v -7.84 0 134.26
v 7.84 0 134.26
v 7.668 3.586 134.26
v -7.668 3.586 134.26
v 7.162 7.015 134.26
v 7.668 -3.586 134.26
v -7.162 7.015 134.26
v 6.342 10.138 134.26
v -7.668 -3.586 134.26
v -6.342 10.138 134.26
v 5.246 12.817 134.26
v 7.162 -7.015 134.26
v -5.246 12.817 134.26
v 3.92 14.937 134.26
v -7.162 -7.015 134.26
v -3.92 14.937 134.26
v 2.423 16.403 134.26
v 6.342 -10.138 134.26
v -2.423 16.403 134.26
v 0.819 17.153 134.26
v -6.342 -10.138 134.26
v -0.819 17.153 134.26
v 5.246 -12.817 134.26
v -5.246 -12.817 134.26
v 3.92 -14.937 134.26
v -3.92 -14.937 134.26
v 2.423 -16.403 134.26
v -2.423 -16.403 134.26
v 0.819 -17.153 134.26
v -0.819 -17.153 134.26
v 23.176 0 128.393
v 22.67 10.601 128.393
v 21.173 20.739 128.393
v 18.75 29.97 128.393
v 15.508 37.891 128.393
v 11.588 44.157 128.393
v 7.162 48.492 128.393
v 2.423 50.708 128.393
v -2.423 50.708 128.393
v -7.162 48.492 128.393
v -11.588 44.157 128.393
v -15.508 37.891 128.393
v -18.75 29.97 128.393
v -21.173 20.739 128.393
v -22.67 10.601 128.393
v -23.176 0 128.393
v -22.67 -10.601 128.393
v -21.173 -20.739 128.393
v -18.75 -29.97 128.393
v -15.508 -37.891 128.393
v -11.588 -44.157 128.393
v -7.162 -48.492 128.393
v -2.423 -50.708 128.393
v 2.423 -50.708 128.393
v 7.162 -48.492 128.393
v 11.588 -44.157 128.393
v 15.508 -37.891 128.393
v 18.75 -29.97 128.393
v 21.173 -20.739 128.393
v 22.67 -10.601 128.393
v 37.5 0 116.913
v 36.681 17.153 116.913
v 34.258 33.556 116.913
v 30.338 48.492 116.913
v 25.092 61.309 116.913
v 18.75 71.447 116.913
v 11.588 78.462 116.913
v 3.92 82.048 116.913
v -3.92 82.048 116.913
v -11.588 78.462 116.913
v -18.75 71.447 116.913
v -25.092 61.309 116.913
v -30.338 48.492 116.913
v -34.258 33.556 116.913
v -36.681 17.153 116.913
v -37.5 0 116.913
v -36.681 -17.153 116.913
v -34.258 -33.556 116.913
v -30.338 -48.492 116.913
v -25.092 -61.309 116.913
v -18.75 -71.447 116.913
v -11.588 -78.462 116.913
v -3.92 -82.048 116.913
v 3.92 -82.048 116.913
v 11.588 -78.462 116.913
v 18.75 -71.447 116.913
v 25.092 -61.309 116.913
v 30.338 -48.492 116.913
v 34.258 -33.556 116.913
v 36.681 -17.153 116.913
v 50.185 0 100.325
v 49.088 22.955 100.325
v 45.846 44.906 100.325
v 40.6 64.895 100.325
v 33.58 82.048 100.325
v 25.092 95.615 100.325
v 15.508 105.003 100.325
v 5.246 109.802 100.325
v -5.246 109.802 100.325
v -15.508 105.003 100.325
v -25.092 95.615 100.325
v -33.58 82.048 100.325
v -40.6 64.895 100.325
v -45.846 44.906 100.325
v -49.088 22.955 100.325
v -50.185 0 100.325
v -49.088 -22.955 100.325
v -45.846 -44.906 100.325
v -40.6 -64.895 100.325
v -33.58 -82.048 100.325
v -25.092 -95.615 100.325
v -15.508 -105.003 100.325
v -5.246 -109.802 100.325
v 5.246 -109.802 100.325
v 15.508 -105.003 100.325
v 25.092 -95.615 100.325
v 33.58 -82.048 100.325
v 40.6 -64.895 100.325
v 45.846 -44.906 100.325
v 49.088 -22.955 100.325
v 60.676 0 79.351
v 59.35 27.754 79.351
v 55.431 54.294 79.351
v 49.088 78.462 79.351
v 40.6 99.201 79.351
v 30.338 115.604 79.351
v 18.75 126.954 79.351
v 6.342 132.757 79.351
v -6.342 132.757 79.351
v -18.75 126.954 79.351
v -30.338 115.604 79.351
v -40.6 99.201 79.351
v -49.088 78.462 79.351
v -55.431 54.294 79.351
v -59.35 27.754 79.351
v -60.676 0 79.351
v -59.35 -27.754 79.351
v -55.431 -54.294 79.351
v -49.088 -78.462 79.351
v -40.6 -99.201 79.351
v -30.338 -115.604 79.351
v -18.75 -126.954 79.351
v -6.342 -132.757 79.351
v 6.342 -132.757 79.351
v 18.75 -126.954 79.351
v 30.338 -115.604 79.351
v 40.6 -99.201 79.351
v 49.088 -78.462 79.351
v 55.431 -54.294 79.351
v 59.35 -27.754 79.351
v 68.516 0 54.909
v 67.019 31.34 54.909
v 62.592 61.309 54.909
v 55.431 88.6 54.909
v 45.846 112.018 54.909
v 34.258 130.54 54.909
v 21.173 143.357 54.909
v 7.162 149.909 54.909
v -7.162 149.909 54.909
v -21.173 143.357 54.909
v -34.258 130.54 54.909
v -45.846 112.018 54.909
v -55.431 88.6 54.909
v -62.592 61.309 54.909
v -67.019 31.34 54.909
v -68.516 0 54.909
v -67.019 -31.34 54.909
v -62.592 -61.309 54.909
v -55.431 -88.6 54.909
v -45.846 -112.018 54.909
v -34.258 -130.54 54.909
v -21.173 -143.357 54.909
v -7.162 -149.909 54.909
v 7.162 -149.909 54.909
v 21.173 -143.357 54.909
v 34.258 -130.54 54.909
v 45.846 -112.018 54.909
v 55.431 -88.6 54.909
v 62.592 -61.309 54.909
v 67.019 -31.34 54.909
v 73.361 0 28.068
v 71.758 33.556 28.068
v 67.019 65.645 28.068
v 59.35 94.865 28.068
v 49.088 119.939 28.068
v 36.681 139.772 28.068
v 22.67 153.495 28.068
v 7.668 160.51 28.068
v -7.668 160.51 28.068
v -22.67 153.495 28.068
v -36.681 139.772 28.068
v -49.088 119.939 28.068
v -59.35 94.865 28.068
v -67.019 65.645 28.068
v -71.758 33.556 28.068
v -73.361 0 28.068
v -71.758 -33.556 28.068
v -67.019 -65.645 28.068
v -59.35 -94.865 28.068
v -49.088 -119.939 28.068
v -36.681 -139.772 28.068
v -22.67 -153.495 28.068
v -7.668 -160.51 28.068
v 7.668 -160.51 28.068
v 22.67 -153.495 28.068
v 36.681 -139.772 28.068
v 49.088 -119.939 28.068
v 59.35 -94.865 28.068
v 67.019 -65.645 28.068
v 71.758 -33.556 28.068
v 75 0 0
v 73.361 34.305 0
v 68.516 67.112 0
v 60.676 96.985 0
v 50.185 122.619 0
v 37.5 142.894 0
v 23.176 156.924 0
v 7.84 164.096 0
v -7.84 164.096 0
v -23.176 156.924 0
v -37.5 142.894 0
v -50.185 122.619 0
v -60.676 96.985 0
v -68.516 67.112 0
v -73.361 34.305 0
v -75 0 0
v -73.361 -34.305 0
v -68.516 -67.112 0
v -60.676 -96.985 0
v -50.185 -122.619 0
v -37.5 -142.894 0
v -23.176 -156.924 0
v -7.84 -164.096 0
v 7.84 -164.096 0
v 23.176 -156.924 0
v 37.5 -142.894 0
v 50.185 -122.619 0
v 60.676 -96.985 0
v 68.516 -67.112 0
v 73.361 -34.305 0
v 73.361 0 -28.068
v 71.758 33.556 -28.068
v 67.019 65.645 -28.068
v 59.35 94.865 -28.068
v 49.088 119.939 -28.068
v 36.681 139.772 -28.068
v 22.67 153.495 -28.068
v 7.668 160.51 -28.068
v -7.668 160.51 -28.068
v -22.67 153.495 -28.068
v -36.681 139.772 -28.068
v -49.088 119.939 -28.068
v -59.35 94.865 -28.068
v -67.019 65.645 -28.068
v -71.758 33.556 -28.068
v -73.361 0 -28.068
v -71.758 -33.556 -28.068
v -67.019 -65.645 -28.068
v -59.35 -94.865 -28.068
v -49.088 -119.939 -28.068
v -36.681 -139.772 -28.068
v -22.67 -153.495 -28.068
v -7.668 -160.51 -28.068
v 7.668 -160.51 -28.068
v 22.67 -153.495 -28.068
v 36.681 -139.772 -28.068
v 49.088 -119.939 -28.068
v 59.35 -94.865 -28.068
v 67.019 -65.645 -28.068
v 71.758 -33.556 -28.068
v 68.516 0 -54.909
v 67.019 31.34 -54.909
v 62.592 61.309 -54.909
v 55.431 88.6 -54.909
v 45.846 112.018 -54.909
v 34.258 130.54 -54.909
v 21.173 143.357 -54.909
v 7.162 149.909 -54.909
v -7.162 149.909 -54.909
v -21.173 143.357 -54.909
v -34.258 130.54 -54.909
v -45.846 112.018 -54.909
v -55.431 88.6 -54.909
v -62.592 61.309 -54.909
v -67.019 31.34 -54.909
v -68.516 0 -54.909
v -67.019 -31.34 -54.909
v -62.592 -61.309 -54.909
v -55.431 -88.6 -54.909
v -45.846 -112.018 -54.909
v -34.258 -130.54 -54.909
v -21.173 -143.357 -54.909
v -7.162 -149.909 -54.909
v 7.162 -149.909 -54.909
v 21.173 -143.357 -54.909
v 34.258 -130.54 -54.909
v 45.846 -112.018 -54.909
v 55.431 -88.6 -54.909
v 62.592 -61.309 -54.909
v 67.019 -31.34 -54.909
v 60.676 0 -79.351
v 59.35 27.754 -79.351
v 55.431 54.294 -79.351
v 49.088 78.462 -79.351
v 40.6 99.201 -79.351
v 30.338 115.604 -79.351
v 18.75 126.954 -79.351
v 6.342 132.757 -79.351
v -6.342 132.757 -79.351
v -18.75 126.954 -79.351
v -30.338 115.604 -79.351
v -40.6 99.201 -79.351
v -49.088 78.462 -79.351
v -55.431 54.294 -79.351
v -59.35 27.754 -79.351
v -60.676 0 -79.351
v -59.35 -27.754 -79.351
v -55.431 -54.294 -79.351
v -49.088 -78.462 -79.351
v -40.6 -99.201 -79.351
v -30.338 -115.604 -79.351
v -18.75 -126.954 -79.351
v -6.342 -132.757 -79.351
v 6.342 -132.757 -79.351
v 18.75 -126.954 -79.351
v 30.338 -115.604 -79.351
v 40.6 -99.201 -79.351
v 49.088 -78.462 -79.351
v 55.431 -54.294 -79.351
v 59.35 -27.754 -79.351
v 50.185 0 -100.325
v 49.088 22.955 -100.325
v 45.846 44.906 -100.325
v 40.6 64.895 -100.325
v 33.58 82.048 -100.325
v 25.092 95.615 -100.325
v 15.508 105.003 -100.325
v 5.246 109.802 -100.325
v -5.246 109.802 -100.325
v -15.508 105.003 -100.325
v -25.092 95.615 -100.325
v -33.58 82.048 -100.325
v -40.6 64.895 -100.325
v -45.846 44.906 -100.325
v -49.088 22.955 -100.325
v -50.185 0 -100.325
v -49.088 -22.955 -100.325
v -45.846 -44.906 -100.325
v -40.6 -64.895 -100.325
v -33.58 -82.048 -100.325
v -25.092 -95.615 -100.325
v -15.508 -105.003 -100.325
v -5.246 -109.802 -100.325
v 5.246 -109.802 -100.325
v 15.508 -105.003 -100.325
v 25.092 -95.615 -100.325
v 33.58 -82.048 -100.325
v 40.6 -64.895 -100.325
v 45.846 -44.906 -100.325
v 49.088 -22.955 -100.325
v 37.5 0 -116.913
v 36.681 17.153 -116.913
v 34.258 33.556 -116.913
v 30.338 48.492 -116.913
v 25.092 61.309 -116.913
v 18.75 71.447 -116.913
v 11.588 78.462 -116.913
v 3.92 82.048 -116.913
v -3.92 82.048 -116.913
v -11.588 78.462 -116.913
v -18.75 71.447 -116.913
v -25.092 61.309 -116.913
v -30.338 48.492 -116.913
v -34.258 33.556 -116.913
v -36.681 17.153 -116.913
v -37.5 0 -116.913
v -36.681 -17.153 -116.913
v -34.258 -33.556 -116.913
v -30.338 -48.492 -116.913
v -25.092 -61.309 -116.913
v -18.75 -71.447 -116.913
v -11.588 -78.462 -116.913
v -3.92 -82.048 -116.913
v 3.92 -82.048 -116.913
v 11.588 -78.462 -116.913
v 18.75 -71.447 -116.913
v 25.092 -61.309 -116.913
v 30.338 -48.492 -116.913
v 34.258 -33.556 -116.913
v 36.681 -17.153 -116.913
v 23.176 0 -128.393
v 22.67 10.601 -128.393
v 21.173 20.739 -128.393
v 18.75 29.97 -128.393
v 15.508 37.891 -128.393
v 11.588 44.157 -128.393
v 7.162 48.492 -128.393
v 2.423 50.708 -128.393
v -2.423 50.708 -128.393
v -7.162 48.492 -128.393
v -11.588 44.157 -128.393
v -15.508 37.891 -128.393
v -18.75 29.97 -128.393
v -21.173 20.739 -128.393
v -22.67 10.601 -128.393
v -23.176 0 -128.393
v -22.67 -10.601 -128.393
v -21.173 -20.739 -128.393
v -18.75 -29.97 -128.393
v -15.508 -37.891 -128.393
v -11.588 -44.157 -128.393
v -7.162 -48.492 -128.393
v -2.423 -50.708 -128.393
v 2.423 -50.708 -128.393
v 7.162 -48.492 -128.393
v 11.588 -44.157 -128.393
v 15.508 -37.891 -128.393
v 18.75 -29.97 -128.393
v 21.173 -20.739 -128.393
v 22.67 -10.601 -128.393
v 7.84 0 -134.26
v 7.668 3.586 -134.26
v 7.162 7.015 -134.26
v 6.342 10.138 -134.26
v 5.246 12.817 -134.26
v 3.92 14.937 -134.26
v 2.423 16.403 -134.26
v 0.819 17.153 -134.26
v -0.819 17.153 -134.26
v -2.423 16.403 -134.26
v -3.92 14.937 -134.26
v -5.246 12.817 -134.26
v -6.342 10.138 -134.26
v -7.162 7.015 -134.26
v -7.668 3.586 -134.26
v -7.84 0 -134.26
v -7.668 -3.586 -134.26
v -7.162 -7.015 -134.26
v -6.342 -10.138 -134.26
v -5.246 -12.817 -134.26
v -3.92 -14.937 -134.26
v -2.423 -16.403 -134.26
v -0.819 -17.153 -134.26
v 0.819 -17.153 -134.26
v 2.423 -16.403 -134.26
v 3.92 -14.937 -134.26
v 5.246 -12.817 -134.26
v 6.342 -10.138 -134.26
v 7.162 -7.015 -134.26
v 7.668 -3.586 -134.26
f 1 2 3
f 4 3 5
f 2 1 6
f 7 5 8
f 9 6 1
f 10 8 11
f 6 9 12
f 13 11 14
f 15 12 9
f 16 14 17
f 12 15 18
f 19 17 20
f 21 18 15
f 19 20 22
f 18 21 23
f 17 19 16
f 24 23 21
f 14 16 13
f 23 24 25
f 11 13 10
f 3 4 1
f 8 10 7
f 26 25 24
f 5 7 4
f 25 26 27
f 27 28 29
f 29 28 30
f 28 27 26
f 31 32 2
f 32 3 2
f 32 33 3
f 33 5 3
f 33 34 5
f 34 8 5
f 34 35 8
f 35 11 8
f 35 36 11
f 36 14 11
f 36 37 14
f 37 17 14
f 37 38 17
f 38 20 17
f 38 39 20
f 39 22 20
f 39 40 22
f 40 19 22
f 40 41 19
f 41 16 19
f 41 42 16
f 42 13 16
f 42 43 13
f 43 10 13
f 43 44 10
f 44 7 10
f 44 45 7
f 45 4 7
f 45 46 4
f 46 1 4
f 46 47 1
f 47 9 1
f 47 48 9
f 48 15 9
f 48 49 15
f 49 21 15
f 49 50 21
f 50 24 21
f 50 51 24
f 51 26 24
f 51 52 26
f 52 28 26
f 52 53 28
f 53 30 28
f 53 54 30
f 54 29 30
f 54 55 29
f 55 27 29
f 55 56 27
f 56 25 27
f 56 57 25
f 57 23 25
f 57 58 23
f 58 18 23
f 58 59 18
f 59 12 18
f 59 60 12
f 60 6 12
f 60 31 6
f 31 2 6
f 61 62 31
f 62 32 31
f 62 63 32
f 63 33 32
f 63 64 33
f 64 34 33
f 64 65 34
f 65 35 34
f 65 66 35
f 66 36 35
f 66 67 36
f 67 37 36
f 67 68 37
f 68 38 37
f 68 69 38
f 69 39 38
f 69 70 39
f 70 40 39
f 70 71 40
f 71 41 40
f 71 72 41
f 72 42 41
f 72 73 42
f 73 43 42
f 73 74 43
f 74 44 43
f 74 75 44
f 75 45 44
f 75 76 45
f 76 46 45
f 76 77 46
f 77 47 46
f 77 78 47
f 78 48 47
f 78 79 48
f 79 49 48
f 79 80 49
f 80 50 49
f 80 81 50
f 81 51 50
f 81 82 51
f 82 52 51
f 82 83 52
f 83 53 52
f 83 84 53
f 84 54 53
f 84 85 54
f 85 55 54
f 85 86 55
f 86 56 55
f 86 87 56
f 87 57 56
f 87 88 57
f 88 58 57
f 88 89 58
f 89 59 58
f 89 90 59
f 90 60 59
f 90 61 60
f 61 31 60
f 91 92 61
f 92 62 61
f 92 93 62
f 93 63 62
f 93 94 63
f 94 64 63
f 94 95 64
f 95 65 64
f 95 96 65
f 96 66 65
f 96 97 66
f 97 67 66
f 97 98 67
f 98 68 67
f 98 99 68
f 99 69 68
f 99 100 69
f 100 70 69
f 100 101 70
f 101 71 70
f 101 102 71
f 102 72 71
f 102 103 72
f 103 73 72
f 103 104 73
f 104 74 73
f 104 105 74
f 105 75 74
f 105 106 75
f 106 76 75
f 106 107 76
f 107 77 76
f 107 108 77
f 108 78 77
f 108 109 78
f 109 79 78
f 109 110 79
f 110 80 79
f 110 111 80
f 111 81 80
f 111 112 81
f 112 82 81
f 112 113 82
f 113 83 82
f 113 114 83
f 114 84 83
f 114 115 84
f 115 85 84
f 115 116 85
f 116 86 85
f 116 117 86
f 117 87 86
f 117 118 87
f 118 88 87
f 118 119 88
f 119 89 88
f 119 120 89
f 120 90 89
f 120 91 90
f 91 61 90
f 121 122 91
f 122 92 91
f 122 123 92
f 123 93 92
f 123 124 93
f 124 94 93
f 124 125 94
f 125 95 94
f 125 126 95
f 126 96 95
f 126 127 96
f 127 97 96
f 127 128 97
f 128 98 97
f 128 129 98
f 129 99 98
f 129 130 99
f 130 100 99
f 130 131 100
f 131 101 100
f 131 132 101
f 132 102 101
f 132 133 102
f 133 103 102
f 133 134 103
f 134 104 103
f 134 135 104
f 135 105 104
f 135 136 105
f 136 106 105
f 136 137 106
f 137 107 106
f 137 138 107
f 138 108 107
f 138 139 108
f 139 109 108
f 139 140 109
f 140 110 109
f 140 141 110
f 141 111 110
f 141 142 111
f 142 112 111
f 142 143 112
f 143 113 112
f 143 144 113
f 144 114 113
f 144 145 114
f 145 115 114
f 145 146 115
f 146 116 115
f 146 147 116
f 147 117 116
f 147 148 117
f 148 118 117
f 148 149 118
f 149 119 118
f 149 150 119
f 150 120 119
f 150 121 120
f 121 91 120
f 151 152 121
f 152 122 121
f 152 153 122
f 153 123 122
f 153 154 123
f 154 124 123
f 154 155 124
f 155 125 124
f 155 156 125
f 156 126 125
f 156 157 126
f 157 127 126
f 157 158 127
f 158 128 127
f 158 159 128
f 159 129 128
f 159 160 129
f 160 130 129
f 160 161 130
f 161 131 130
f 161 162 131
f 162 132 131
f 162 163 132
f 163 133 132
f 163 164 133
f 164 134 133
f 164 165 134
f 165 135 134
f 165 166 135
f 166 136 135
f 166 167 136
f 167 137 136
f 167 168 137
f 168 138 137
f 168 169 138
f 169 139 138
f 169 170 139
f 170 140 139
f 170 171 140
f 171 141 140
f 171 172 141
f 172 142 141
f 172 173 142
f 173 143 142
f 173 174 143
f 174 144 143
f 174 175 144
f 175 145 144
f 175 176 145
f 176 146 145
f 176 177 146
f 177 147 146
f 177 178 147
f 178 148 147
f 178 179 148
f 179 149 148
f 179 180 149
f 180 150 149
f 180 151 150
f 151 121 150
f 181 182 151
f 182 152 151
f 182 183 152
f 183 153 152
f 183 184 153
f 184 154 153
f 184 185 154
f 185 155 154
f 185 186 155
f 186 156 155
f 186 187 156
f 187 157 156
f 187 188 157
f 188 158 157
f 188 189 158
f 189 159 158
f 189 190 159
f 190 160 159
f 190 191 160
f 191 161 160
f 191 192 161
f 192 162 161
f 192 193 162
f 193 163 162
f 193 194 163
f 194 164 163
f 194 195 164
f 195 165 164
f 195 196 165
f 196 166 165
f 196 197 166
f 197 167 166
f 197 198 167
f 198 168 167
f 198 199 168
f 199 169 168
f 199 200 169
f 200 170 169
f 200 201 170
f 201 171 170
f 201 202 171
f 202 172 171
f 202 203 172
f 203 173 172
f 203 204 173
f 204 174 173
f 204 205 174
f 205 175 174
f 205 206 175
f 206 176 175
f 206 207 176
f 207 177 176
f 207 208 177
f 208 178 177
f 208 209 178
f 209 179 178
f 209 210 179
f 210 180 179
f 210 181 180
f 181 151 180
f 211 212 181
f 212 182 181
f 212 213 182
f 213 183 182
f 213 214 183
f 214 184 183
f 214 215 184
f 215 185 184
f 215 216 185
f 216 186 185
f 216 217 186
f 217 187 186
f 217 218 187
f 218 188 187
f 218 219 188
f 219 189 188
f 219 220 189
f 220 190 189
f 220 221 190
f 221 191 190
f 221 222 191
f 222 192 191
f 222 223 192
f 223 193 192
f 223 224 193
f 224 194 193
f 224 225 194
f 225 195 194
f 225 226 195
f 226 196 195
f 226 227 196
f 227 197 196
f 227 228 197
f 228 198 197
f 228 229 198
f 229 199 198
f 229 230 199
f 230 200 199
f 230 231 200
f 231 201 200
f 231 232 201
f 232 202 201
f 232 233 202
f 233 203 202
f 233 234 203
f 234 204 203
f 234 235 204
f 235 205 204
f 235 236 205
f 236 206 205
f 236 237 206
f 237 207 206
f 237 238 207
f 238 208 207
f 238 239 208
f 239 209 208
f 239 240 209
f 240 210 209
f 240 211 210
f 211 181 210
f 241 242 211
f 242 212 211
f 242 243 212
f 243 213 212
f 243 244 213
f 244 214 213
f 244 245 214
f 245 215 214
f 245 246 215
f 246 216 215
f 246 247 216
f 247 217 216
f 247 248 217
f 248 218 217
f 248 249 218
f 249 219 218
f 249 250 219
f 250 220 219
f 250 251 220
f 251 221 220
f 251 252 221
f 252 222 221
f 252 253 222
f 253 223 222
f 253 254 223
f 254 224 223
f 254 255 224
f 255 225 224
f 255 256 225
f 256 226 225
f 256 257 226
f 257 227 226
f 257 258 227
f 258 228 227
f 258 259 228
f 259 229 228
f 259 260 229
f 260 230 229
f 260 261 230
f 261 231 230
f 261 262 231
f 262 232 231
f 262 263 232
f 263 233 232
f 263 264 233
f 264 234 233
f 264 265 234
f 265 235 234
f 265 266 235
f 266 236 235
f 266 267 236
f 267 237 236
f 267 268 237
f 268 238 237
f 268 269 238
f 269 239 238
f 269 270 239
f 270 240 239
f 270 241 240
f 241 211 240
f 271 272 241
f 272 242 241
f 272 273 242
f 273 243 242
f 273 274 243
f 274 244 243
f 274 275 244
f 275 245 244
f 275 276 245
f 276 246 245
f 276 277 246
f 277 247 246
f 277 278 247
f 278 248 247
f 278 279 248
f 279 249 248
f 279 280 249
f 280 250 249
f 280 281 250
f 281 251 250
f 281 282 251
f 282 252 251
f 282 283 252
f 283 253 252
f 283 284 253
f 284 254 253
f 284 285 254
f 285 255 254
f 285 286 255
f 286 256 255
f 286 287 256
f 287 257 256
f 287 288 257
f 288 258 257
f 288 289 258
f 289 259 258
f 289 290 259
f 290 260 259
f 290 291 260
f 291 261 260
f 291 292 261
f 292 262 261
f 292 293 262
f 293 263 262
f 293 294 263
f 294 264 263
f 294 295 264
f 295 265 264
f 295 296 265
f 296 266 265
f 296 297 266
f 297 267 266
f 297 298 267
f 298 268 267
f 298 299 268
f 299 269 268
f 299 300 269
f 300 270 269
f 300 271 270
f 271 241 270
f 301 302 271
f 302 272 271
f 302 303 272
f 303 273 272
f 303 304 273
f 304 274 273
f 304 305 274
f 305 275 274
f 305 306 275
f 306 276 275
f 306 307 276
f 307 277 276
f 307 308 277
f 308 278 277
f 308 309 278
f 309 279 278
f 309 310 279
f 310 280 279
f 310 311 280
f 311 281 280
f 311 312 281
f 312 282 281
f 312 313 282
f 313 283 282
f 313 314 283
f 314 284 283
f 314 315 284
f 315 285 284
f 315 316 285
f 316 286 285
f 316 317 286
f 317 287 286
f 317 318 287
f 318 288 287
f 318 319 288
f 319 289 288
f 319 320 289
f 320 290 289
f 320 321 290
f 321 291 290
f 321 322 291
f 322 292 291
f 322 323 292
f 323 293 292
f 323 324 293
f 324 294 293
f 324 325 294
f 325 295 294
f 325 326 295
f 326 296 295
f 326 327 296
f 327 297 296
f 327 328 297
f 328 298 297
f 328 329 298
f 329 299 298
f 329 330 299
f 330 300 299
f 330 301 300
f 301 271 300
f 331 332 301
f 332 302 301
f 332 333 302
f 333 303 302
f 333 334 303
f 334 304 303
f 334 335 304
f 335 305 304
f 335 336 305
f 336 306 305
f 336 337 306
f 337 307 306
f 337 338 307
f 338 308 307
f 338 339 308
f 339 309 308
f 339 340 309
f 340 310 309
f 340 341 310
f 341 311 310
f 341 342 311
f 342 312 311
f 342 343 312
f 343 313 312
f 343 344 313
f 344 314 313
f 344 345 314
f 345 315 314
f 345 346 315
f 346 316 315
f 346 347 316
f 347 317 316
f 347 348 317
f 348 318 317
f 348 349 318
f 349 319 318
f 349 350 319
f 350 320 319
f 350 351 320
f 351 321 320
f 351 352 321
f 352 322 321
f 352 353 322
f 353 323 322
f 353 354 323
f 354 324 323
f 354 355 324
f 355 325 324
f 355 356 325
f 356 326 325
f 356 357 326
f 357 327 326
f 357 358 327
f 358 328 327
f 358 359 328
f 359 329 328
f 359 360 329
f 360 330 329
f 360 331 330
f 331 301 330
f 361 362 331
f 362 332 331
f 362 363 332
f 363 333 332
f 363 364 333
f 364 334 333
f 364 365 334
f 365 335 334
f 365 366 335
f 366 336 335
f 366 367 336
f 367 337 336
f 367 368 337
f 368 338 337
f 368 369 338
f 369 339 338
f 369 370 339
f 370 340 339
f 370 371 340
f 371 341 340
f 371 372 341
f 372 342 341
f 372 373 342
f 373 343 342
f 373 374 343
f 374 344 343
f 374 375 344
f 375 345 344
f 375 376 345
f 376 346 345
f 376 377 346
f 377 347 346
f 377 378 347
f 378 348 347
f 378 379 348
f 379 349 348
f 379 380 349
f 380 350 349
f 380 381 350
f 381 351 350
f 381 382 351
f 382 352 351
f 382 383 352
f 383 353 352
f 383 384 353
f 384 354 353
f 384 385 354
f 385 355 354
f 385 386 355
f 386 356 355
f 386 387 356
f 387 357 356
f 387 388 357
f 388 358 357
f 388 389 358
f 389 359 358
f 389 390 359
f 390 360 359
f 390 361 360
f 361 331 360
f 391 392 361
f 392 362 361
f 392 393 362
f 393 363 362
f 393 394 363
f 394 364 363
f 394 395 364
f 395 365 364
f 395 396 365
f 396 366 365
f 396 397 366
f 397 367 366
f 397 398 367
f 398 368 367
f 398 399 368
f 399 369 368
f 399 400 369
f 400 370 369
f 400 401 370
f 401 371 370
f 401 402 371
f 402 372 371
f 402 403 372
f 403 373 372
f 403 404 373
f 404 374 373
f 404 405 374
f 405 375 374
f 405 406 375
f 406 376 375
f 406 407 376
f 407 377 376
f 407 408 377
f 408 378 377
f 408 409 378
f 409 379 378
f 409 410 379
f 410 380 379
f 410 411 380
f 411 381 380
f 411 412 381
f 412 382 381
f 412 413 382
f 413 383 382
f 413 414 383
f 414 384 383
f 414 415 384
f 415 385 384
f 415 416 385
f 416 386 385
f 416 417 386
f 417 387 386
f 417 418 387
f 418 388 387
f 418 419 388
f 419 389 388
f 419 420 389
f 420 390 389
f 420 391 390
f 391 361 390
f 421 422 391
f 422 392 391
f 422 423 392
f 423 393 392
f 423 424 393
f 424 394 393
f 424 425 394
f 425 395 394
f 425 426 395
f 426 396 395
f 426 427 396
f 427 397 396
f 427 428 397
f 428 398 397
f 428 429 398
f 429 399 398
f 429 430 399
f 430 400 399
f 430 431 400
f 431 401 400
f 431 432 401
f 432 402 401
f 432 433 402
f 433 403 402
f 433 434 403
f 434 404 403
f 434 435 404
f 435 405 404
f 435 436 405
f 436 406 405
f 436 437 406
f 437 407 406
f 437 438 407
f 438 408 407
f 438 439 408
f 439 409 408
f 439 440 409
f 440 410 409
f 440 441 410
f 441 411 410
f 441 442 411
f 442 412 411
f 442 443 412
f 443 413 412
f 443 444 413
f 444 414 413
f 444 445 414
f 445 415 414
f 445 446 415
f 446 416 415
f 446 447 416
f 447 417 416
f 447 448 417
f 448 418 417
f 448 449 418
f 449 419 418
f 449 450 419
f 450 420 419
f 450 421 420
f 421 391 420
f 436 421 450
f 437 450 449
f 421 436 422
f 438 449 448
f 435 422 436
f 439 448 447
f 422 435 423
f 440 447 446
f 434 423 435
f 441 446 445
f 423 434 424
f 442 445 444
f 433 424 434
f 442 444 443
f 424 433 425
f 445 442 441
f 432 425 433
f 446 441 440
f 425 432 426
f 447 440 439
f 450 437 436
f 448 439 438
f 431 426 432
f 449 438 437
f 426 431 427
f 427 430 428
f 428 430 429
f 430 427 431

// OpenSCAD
// Generated by SolidPython 1.0.1 on 2020-07-29 00:46:46


scale(v = [5, 11, 9]) {
	sphere(r = 15);
}
/***********************************************
*********      SolidPython code:      **********
************************************************
 
# import packages: SolidPython
from solid import *
from solid.utils import *
from itertools import chain, combinations, permutations


class Resize:

    def __init__(self, scad_file):
        self.scad_file = scad_file
        #self.scad_file = import_scad(scad_file)
        # cone/cylinder param:
        self.r1 = 0
        self.r2 = 0
        self.h = 0
        # rectangular prism param:
        self.w = 0
        self.l = 0
        # ellipse param:
        self.r = 0

    # import OpenScad code (file name corresponds to shape)


    # classify shape + parameters
    def assign(self, param1, param2, param3):
        if self.scad_file == 'cone.scad':
            self.r1 = param1
            self.r2 = param2
            self.h = param3
        elif self.scad_file == 'cylinder.scad':
            self.r1 = param1
            self.r2 = param2
            self.h = param3
        elif self.scad_file == 'rectangularPrism.scad':
            self.h = param1
            self.l = param2
            self.w = param3
        else:
            self.r = param1
            self.h = param2

    # resize parameters
    def iterate(self):
        x = range(3, 20, 2)
        i = 1
        if self.scad_file == 'cone.scad':
            tempList = list(permutations(x, 2))
            for temp in tempList:
                param1 = temp[0]
                param2 = temp[1]
                filepath = 'produced_scad_files/' + 'cone' + str(param1) + '_' + str(param2) + '_' + '.scad'
                scad_render_to_file(cylinder(h=param1, r1=param2, r2=0), filepath)

        elif self.scad_file == 'cylinder.scad':
            tempList = list(permutations(x, 3))
            for temp in tempList:
                param1 = temp[0]
                param2 = temp[1]
                filepath = 'produced_scad_files/' + 'cylinder' + str(param1) + '_' + str(param2) + '_' + '.scad'
                scad_render_to_file(cylinder(h=param1, r1=param2, r2=param2), filepath)

        elif self.scad_file == 'rectangularPrism.scad':
            tempList = list(permutations(x, 3))
            for temp in tempList:
                param1 = temp[0]
                param2 = temp[1]
                param3 = temp[2]
                filepath = 'produced_scad_files/' + 'rectangularPrism' + str(param1) + '_' + str(param2) + '_' + str(
                    param3) + '.scad'
                scad_render_to_file(cube(size=(param1, param2, param3)), filepath)

        elif self.scad_file == 'ellipse.scad':
            tempList = list(permutations(x, 4))
            for temp in tempList:
                param1 = temp[0]
                param2 = temp[1]
                param3 = temp[2]
                param4 = temp[3]
                filepath = 'produced_scad_files/' + 'ellipse' + str(param1) + '_' + str(param2) + '_' + str(param3) + '_' + str(param4) + '.scad'
                scad_render_to_file(scale([param1, param2, param3])(sphere(r=param4)), filepath)

    def render_to_scadfile(self):
        scad_render_to_file(scad, 'example.scad') 
 
************************************************/
